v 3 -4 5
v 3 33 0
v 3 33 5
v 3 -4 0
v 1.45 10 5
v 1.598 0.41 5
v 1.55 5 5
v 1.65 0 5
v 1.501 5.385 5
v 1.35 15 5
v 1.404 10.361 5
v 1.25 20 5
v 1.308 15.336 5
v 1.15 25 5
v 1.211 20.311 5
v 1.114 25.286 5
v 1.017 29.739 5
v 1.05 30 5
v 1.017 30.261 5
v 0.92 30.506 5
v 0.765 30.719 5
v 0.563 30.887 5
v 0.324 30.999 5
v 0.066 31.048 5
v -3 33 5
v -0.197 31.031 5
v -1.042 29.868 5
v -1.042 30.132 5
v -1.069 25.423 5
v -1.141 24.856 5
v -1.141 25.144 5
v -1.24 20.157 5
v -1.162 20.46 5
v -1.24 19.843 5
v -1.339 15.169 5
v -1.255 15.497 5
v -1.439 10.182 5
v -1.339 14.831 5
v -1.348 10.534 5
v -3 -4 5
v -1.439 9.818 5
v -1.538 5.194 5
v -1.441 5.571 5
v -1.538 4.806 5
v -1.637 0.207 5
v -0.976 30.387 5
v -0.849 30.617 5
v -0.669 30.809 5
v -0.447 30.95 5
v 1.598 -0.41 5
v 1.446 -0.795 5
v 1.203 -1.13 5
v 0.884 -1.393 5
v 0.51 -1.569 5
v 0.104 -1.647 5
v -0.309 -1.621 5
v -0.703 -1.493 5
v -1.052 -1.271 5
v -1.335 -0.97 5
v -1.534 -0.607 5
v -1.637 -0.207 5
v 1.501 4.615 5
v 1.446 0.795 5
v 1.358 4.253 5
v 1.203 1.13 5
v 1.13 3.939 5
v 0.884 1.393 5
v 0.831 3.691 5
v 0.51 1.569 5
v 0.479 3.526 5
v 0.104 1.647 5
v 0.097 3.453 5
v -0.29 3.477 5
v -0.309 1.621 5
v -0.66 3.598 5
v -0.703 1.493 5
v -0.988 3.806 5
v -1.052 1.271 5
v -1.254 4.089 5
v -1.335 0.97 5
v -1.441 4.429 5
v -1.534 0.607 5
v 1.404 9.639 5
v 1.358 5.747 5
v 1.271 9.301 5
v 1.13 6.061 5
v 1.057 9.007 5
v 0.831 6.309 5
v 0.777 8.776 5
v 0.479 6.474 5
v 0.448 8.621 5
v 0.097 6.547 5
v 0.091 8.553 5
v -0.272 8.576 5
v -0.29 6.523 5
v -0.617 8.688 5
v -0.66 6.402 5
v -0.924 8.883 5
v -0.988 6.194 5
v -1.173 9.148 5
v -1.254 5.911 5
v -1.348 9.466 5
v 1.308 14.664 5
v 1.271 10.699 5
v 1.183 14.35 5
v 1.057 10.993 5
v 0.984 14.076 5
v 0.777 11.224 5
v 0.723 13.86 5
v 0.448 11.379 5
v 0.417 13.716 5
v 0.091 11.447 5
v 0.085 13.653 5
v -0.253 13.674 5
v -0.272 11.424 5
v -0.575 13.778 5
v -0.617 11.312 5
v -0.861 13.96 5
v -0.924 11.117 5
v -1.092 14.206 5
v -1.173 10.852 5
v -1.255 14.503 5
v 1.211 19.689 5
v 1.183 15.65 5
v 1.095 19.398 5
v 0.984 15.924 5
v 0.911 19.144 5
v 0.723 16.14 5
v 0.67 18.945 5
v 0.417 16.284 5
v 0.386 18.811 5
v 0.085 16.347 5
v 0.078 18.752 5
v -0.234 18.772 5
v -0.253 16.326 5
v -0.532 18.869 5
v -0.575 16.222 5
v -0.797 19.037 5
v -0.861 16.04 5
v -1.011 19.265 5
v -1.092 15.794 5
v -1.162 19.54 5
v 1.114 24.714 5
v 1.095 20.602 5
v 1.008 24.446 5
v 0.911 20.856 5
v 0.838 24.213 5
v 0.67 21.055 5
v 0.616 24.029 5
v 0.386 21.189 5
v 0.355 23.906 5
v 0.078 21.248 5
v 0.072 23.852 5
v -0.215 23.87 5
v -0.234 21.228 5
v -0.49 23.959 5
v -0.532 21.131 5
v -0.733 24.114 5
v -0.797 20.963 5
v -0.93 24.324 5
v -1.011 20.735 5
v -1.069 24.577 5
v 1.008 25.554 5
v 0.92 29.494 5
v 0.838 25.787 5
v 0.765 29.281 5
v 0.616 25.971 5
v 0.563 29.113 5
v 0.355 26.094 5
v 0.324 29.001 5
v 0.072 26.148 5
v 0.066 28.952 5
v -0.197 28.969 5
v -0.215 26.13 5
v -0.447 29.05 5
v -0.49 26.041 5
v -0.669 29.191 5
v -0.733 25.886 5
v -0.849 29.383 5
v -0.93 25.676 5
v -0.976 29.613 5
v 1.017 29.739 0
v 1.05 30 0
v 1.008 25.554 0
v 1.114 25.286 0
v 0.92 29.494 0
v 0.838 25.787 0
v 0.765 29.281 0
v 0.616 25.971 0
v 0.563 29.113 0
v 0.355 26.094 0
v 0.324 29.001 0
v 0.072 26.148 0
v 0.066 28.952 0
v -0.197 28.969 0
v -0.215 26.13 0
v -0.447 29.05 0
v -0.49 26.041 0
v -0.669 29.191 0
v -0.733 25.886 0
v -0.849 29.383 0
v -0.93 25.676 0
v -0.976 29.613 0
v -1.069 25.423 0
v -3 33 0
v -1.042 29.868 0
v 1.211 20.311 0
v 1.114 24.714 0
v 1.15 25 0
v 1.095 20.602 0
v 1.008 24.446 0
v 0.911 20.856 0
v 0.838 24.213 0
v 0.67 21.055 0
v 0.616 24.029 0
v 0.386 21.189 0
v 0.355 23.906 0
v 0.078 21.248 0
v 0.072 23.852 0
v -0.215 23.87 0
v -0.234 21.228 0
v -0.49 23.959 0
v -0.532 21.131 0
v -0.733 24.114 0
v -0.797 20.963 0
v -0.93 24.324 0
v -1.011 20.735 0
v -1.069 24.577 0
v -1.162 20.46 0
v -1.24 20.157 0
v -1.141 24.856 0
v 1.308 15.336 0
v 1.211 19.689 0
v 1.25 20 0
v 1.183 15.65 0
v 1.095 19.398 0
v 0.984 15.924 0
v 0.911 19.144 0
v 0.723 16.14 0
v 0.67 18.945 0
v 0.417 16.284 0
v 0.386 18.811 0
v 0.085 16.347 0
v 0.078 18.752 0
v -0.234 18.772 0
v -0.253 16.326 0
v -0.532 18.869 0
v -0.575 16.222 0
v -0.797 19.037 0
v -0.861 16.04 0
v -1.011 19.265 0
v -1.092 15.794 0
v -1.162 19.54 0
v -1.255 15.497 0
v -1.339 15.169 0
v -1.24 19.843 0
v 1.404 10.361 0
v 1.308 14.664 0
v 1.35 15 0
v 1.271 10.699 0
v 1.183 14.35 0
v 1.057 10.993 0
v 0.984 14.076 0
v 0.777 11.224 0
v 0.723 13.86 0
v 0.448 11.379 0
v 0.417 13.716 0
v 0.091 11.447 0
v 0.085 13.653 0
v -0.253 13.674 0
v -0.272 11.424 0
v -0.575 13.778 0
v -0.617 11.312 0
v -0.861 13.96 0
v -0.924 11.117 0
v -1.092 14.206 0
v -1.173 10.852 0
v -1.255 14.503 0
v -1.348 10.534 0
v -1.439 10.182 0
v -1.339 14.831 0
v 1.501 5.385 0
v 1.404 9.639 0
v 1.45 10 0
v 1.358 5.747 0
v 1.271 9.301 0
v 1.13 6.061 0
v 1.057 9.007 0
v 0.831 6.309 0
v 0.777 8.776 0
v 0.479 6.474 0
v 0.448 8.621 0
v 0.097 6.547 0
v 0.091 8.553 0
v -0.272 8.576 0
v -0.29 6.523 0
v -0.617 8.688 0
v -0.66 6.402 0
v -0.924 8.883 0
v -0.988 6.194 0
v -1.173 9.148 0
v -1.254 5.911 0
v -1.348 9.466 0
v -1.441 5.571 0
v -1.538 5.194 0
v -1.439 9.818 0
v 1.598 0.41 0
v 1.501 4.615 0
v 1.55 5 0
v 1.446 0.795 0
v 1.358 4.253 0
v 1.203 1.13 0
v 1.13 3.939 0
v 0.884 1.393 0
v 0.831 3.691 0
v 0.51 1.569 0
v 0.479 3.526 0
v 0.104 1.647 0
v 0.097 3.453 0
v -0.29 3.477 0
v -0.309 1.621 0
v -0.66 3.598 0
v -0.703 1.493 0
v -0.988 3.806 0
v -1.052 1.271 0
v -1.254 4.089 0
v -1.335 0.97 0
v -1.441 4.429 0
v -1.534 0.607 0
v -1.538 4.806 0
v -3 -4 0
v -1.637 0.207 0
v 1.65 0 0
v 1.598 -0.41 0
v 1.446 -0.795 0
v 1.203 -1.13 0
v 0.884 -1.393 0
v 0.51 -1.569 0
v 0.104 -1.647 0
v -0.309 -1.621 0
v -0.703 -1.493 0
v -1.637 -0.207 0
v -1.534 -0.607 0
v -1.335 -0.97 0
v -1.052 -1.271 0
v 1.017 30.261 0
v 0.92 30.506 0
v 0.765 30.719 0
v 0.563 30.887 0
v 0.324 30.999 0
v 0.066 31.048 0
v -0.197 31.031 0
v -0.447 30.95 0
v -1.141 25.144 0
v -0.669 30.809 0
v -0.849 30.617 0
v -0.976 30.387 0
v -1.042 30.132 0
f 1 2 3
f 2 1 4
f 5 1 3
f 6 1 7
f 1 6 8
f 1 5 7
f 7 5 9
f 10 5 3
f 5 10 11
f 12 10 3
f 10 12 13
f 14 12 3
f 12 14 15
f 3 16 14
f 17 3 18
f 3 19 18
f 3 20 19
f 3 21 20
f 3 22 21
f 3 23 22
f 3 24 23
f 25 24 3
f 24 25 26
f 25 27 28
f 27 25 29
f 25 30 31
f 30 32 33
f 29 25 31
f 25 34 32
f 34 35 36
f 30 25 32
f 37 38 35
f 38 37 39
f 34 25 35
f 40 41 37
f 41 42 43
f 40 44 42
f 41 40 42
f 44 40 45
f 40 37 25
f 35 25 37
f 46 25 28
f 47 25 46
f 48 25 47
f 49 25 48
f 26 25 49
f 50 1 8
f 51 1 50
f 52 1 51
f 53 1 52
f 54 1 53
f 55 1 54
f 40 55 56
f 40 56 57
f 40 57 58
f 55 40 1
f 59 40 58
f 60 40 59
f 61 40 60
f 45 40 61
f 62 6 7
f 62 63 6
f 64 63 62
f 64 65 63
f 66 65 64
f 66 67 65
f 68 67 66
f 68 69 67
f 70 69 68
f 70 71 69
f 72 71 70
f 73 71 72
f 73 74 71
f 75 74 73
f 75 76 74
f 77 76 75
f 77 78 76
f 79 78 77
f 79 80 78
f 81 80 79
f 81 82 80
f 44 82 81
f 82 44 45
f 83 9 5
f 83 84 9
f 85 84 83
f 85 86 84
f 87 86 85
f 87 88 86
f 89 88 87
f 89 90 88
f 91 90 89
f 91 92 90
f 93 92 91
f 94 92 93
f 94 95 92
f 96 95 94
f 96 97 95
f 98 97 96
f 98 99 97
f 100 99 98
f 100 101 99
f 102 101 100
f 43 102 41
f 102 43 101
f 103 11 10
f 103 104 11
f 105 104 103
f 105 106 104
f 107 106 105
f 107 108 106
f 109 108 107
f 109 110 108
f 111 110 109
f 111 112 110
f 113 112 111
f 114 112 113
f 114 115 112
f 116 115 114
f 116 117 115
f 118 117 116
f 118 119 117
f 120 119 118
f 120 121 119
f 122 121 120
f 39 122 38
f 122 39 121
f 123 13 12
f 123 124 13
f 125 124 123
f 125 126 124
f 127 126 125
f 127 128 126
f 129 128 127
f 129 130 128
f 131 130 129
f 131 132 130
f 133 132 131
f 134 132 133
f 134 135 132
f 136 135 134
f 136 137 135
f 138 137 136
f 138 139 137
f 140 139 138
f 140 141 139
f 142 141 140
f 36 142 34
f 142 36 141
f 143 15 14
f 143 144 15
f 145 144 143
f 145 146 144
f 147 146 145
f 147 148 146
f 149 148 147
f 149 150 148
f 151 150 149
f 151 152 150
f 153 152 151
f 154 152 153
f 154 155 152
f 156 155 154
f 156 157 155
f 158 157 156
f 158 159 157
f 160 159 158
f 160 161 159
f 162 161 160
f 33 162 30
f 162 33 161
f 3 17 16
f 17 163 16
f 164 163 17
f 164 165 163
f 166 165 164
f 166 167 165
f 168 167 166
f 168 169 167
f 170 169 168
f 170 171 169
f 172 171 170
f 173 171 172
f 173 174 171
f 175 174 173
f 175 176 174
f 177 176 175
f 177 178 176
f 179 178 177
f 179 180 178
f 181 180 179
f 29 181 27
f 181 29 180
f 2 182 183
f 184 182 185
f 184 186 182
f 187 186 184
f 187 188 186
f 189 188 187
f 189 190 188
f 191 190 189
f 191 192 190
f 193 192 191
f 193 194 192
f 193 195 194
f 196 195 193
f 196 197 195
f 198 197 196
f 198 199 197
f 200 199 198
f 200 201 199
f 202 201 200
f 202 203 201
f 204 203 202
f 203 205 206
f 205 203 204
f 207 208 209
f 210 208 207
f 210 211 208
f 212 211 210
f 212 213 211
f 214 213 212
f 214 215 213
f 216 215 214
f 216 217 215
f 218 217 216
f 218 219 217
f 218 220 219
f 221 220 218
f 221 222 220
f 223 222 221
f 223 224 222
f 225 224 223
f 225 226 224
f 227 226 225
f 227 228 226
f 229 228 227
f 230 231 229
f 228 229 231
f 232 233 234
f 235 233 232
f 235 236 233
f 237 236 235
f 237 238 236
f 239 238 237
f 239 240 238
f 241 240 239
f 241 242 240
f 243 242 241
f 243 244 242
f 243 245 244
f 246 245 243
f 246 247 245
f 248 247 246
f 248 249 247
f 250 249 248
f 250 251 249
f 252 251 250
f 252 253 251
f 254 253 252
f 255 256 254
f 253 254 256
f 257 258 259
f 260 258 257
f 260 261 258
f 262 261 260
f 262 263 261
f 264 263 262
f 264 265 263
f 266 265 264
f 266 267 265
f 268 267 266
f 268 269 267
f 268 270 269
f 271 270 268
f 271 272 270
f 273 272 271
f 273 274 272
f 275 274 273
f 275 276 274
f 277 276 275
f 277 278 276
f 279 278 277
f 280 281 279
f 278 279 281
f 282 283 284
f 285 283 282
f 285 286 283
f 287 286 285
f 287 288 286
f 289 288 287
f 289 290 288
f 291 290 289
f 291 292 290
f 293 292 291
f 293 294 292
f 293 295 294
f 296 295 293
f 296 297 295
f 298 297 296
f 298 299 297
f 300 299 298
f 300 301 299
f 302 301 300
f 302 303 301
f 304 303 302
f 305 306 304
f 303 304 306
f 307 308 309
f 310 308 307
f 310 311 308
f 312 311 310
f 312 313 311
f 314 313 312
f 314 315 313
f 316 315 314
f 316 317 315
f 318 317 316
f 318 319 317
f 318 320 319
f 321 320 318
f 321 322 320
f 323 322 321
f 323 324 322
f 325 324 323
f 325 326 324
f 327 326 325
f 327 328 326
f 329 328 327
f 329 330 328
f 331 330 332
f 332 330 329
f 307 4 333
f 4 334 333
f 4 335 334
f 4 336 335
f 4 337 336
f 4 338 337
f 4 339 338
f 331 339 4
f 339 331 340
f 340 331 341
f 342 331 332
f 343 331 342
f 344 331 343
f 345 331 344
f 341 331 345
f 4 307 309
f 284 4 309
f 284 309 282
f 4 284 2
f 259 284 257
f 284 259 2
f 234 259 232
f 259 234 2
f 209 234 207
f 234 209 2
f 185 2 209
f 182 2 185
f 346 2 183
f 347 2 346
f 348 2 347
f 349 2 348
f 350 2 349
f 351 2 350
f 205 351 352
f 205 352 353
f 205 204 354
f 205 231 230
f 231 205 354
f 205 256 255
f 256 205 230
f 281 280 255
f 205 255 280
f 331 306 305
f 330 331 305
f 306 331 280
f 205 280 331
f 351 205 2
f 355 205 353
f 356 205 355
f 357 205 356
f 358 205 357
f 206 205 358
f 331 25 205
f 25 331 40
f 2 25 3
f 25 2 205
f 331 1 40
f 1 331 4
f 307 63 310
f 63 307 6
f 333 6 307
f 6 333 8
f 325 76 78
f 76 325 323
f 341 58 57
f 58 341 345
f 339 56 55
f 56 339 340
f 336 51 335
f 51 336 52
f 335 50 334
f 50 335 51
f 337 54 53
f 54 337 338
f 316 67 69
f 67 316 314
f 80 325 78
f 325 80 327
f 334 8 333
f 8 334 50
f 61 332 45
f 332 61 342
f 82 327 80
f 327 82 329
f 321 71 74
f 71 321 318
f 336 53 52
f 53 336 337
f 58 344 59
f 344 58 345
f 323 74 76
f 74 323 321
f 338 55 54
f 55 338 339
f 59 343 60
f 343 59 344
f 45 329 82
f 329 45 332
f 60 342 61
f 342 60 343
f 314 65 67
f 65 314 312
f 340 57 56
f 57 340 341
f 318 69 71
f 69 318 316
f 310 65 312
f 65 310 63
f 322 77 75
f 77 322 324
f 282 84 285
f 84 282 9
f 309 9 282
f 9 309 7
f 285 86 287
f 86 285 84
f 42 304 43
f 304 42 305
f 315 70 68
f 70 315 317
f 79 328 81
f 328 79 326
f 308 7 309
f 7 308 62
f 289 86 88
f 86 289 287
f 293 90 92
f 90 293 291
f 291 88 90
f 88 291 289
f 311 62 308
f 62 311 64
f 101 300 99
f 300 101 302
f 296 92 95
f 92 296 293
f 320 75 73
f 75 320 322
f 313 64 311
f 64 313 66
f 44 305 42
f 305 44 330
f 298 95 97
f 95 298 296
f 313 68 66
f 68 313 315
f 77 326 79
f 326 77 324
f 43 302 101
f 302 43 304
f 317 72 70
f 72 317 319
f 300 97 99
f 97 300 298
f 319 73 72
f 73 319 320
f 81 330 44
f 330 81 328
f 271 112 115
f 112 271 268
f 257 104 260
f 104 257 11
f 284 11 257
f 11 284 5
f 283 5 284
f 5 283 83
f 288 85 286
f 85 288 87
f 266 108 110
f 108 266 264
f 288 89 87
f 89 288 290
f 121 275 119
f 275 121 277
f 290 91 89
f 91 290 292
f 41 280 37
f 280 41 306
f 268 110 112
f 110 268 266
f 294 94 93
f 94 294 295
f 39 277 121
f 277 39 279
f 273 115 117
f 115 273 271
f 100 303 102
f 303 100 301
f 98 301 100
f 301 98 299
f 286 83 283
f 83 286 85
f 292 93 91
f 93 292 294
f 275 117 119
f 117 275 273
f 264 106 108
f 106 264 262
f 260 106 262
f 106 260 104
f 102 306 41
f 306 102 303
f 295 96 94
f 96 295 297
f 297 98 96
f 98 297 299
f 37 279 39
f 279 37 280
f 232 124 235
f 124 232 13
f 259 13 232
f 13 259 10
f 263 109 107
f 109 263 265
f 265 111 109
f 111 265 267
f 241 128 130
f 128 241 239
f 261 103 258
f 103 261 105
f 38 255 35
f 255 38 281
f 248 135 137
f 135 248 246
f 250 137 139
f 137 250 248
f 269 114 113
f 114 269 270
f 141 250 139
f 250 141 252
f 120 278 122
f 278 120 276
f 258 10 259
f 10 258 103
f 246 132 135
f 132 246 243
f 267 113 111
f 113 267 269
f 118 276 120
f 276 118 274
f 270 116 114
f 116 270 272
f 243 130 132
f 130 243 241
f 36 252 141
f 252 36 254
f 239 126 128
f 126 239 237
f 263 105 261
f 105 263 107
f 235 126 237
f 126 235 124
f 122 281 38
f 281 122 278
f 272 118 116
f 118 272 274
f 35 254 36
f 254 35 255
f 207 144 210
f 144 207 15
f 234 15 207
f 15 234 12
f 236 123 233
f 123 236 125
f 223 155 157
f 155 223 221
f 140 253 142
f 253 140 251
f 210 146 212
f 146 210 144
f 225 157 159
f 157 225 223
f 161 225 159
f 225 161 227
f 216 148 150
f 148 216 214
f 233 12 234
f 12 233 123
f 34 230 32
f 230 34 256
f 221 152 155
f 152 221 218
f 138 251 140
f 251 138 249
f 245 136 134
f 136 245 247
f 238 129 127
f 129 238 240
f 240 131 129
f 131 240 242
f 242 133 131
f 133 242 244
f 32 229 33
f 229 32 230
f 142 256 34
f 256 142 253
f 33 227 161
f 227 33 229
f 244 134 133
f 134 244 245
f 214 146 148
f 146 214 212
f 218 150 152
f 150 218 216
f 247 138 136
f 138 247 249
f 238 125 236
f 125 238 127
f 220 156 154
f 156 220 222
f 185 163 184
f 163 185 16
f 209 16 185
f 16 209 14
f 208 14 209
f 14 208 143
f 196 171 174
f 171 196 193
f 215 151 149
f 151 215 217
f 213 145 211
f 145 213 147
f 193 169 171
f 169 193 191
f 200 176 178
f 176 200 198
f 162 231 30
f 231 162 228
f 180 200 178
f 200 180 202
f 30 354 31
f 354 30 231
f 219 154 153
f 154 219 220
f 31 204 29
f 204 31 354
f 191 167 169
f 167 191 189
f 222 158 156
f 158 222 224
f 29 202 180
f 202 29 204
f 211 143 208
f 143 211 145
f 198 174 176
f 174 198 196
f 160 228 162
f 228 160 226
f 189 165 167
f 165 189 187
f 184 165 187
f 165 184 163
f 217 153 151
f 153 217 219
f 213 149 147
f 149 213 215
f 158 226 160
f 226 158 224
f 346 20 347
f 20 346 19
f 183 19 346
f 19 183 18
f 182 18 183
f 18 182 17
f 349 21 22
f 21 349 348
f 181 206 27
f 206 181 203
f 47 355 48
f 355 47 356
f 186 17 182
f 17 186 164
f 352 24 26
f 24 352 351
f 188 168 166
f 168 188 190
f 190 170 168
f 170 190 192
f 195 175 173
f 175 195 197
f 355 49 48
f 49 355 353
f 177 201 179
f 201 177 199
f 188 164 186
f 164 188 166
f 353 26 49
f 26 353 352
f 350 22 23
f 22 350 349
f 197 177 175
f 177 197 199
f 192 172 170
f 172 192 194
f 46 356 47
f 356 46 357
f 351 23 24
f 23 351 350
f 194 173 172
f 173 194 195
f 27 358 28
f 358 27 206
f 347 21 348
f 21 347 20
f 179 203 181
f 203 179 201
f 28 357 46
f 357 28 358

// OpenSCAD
$fn=25;

screwRadiusM5 = 3.7/2; // ?
screwRadiusM3 = 1.55;
screwRadiusM3_smooth = 1.6; // 1.65 for sure

difference() {
    translate([-3, -4, 0])
    cube([6, 37, 5]);
    
    screwRadiusM3 = 2.7/2;
  
    cylinder(r=screwRadiusM3 + .3, 5);
    translate([0, 5, 0])
    cylinder(r=screwRadiusM3 + .2, 5);
    translate([0, 5*2, 0])
    cylinder(r=screwRadiusM3 + .1, 5);
    translate([0, 5*3, 0])
    cylinder(r=screwRadiusM3, 5);
    translate([0, 5*4, 0])
    cylinder(r=screwRadiusM3 - .1, 5);
    translate([0, 5*5, 0])
    cylinder(r=screwRadiusM3 - .2, 5);
    translate([0, 5*6, 0])
    cylinder(r=screwRadiusM3 - .3, 5);
}
